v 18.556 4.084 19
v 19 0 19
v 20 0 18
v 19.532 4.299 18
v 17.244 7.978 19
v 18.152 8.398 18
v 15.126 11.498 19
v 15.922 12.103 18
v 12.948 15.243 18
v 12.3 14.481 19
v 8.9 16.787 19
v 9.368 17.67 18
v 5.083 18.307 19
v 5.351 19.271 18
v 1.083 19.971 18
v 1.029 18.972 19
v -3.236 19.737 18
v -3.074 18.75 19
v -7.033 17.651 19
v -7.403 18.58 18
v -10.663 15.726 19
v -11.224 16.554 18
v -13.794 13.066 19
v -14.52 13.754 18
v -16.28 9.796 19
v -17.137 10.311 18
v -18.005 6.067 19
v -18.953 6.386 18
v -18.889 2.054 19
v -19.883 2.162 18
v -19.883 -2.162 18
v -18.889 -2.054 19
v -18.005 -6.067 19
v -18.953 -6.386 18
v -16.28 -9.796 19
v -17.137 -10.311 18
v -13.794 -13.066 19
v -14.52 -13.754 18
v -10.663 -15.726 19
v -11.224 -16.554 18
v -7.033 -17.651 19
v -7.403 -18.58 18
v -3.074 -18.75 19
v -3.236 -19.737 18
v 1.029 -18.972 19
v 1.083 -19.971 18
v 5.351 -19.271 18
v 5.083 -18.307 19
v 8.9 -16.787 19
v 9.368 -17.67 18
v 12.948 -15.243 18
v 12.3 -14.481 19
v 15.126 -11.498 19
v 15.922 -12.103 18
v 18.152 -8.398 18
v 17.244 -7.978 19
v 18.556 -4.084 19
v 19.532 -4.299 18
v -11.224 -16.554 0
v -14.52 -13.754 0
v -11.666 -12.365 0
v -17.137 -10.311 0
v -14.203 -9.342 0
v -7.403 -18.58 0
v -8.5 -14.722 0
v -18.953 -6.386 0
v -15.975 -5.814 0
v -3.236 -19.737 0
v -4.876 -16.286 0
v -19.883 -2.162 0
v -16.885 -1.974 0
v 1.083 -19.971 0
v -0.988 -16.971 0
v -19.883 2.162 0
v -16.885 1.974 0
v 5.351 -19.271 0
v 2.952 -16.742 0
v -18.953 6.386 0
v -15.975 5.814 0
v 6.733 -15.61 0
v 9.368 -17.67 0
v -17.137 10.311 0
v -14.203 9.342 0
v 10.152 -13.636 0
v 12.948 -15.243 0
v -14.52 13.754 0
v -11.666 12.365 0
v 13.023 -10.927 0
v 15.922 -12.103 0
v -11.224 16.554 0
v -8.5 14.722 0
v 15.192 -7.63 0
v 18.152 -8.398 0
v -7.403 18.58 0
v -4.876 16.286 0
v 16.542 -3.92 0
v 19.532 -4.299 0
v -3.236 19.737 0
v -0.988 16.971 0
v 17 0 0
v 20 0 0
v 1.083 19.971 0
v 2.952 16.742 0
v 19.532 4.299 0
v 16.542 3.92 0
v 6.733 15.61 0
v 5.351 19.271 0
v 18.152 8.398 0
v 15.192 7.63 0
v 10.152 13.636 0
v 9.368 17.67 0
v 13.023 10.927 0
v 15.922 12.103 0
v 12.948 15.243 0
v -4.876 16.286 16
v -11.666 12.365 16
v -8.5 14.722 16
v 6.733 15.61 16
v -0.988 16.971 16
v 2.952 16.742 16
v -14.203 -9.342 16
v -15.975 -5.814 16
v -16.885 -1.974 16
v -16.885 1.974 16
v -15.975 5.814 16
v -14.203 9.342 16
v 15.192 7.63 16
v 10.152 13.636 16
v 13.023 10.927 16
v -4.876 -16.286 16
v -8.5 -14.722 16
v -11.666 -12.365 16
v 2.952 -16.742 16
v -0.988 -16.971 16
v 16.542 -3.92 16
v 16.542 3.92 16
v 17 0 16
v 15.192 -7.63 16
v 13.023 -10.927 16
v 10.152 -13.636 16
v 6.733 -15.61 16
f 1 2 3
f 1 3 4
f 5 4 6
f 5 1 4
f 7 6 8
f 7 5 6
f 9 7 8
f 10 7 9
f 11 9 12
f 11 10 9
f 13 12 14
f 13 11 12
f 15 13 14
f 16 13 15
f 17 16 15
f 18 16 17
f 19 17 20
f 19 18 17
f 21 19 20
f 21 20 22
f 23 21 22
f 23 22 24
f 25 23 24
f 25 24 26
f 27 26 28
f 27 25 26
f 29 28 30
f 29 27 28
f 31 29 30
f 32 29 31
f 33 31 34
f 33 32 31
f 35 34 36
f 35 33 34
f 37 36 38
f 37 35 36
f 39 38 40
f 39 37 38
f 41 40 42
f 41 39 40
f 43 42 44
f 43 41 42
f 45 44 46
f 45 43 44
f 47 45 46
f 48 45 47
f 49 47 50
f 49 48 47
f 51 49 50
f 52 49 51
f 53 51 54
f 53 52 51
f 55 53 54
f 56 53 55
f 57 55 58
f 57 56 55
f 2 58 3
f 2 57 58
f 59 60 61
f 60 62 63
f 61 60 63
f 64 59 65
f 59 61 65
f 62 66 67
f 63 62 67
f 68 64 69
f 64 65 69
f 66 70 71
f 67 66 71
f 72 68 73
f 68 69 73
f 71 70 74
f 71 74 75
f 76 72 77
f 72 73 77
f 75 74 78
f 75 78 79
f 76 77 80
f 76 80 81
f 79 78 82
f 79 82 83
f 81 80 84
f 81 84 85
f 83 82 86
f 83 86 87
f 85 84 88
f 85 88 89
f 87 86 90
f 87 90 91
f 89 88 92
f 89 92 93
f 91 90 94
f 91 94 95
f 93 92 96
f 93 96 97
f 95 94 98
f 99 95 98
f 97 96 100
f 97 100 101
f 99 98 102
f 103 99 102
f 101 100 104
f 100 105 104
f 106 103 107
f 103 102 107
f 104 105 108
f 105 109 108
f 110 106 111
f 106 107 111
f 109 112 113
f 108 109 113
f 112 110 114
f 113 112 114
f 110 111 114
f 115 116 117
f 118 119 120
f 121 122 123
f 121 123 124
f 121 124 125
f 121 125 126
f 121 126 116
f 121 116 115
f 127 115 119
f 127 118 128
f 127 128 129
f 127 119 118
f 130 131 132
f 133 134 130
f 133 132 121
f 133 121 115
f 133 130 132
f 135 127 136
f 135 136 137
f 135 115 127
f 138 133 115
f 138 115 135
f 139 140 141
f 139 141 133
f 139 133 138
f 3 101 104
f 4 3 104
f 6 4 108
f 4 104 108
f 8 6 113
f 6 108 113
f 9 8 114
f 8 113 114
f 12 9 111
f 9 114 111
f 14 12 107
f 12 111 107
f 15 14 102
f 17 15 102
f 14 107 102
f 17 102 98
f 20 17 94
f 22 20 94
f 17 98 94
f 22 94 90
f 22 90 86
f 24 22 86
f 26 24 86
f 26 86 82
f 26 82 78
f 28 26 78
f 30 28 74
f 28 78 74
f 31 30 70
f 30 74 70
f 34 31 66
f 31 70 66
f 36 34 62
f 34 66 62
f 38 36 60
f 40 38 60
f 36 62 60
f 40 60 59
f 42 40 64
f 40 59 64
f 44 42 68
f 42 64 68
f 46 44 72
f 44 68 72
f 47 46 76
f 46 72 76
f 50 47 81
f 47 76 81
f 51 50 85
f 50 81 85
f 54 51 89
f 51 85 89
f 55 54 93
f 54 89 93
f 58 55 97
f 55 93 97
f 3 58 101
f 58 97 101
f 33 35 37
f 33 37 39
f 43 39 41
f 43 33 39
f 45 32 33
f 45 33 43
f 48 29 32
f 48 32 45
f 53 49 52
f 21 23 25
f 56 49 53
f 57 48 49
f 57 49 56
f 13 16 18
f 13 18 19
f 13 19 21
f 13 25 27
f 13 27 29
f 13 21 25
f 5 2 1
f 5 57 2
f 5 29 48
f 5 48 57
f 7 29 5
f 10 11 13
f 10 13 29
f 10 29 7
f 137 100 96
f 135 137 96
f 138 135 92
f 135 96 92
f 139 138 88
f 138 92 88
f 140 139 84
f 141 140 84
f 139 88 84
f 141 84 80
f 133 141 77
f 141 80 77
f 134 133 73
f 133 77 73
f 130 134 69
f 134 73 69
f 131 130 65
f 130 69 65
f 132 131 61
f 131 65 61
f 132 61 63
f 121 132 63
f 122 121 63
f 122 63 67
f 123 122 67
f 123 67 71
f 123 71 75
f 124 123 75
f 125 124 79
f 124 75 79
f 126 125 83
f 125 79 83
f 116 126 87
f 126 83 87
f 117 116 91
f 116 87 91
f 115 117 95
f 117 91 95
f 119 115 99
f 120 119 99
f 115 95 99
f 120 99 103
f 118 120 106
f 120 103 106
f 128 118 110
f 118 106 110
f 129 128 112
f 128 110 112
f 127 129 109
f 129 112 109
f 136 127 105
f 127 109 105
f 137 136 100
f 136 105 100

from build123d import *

# Parameters (mm, degrees)
SKETCH_R        = 20
PAD_DEPTH       = 19
SKETCH001_R     = 17
POCKET_DEPTH    = 16
CHAMFER001_SIZE = 1


with BuildPart() as part:
    # Sketch → Pad (new body)
    with BuildSketch(Plane.XY):
        Circle(SKETCH_R)
    extrude(amount=PAD_DEPTH)

    # Sketch001 (on Face2 of Pad) → Pocket (cut)
    with BuildSketch(Plane(origin=(0, 0, 0), x_dir=(1, 0, 0), z_dir=(0, 0, -1))):
        Circle(SKETCH001_R)
    extrude(amount=-POCKET_DEPTH, mode=Mode.SUBTRACT)

    # Chamfer001
    chamfer001_edges = [part.edges().sort_by_distance(p)[0] for p in [
        (-20, 0, 19),
    ]]
    chamfer(chamfer001_edges, length=CHAMFER001_SIZE)


solid = part.part
